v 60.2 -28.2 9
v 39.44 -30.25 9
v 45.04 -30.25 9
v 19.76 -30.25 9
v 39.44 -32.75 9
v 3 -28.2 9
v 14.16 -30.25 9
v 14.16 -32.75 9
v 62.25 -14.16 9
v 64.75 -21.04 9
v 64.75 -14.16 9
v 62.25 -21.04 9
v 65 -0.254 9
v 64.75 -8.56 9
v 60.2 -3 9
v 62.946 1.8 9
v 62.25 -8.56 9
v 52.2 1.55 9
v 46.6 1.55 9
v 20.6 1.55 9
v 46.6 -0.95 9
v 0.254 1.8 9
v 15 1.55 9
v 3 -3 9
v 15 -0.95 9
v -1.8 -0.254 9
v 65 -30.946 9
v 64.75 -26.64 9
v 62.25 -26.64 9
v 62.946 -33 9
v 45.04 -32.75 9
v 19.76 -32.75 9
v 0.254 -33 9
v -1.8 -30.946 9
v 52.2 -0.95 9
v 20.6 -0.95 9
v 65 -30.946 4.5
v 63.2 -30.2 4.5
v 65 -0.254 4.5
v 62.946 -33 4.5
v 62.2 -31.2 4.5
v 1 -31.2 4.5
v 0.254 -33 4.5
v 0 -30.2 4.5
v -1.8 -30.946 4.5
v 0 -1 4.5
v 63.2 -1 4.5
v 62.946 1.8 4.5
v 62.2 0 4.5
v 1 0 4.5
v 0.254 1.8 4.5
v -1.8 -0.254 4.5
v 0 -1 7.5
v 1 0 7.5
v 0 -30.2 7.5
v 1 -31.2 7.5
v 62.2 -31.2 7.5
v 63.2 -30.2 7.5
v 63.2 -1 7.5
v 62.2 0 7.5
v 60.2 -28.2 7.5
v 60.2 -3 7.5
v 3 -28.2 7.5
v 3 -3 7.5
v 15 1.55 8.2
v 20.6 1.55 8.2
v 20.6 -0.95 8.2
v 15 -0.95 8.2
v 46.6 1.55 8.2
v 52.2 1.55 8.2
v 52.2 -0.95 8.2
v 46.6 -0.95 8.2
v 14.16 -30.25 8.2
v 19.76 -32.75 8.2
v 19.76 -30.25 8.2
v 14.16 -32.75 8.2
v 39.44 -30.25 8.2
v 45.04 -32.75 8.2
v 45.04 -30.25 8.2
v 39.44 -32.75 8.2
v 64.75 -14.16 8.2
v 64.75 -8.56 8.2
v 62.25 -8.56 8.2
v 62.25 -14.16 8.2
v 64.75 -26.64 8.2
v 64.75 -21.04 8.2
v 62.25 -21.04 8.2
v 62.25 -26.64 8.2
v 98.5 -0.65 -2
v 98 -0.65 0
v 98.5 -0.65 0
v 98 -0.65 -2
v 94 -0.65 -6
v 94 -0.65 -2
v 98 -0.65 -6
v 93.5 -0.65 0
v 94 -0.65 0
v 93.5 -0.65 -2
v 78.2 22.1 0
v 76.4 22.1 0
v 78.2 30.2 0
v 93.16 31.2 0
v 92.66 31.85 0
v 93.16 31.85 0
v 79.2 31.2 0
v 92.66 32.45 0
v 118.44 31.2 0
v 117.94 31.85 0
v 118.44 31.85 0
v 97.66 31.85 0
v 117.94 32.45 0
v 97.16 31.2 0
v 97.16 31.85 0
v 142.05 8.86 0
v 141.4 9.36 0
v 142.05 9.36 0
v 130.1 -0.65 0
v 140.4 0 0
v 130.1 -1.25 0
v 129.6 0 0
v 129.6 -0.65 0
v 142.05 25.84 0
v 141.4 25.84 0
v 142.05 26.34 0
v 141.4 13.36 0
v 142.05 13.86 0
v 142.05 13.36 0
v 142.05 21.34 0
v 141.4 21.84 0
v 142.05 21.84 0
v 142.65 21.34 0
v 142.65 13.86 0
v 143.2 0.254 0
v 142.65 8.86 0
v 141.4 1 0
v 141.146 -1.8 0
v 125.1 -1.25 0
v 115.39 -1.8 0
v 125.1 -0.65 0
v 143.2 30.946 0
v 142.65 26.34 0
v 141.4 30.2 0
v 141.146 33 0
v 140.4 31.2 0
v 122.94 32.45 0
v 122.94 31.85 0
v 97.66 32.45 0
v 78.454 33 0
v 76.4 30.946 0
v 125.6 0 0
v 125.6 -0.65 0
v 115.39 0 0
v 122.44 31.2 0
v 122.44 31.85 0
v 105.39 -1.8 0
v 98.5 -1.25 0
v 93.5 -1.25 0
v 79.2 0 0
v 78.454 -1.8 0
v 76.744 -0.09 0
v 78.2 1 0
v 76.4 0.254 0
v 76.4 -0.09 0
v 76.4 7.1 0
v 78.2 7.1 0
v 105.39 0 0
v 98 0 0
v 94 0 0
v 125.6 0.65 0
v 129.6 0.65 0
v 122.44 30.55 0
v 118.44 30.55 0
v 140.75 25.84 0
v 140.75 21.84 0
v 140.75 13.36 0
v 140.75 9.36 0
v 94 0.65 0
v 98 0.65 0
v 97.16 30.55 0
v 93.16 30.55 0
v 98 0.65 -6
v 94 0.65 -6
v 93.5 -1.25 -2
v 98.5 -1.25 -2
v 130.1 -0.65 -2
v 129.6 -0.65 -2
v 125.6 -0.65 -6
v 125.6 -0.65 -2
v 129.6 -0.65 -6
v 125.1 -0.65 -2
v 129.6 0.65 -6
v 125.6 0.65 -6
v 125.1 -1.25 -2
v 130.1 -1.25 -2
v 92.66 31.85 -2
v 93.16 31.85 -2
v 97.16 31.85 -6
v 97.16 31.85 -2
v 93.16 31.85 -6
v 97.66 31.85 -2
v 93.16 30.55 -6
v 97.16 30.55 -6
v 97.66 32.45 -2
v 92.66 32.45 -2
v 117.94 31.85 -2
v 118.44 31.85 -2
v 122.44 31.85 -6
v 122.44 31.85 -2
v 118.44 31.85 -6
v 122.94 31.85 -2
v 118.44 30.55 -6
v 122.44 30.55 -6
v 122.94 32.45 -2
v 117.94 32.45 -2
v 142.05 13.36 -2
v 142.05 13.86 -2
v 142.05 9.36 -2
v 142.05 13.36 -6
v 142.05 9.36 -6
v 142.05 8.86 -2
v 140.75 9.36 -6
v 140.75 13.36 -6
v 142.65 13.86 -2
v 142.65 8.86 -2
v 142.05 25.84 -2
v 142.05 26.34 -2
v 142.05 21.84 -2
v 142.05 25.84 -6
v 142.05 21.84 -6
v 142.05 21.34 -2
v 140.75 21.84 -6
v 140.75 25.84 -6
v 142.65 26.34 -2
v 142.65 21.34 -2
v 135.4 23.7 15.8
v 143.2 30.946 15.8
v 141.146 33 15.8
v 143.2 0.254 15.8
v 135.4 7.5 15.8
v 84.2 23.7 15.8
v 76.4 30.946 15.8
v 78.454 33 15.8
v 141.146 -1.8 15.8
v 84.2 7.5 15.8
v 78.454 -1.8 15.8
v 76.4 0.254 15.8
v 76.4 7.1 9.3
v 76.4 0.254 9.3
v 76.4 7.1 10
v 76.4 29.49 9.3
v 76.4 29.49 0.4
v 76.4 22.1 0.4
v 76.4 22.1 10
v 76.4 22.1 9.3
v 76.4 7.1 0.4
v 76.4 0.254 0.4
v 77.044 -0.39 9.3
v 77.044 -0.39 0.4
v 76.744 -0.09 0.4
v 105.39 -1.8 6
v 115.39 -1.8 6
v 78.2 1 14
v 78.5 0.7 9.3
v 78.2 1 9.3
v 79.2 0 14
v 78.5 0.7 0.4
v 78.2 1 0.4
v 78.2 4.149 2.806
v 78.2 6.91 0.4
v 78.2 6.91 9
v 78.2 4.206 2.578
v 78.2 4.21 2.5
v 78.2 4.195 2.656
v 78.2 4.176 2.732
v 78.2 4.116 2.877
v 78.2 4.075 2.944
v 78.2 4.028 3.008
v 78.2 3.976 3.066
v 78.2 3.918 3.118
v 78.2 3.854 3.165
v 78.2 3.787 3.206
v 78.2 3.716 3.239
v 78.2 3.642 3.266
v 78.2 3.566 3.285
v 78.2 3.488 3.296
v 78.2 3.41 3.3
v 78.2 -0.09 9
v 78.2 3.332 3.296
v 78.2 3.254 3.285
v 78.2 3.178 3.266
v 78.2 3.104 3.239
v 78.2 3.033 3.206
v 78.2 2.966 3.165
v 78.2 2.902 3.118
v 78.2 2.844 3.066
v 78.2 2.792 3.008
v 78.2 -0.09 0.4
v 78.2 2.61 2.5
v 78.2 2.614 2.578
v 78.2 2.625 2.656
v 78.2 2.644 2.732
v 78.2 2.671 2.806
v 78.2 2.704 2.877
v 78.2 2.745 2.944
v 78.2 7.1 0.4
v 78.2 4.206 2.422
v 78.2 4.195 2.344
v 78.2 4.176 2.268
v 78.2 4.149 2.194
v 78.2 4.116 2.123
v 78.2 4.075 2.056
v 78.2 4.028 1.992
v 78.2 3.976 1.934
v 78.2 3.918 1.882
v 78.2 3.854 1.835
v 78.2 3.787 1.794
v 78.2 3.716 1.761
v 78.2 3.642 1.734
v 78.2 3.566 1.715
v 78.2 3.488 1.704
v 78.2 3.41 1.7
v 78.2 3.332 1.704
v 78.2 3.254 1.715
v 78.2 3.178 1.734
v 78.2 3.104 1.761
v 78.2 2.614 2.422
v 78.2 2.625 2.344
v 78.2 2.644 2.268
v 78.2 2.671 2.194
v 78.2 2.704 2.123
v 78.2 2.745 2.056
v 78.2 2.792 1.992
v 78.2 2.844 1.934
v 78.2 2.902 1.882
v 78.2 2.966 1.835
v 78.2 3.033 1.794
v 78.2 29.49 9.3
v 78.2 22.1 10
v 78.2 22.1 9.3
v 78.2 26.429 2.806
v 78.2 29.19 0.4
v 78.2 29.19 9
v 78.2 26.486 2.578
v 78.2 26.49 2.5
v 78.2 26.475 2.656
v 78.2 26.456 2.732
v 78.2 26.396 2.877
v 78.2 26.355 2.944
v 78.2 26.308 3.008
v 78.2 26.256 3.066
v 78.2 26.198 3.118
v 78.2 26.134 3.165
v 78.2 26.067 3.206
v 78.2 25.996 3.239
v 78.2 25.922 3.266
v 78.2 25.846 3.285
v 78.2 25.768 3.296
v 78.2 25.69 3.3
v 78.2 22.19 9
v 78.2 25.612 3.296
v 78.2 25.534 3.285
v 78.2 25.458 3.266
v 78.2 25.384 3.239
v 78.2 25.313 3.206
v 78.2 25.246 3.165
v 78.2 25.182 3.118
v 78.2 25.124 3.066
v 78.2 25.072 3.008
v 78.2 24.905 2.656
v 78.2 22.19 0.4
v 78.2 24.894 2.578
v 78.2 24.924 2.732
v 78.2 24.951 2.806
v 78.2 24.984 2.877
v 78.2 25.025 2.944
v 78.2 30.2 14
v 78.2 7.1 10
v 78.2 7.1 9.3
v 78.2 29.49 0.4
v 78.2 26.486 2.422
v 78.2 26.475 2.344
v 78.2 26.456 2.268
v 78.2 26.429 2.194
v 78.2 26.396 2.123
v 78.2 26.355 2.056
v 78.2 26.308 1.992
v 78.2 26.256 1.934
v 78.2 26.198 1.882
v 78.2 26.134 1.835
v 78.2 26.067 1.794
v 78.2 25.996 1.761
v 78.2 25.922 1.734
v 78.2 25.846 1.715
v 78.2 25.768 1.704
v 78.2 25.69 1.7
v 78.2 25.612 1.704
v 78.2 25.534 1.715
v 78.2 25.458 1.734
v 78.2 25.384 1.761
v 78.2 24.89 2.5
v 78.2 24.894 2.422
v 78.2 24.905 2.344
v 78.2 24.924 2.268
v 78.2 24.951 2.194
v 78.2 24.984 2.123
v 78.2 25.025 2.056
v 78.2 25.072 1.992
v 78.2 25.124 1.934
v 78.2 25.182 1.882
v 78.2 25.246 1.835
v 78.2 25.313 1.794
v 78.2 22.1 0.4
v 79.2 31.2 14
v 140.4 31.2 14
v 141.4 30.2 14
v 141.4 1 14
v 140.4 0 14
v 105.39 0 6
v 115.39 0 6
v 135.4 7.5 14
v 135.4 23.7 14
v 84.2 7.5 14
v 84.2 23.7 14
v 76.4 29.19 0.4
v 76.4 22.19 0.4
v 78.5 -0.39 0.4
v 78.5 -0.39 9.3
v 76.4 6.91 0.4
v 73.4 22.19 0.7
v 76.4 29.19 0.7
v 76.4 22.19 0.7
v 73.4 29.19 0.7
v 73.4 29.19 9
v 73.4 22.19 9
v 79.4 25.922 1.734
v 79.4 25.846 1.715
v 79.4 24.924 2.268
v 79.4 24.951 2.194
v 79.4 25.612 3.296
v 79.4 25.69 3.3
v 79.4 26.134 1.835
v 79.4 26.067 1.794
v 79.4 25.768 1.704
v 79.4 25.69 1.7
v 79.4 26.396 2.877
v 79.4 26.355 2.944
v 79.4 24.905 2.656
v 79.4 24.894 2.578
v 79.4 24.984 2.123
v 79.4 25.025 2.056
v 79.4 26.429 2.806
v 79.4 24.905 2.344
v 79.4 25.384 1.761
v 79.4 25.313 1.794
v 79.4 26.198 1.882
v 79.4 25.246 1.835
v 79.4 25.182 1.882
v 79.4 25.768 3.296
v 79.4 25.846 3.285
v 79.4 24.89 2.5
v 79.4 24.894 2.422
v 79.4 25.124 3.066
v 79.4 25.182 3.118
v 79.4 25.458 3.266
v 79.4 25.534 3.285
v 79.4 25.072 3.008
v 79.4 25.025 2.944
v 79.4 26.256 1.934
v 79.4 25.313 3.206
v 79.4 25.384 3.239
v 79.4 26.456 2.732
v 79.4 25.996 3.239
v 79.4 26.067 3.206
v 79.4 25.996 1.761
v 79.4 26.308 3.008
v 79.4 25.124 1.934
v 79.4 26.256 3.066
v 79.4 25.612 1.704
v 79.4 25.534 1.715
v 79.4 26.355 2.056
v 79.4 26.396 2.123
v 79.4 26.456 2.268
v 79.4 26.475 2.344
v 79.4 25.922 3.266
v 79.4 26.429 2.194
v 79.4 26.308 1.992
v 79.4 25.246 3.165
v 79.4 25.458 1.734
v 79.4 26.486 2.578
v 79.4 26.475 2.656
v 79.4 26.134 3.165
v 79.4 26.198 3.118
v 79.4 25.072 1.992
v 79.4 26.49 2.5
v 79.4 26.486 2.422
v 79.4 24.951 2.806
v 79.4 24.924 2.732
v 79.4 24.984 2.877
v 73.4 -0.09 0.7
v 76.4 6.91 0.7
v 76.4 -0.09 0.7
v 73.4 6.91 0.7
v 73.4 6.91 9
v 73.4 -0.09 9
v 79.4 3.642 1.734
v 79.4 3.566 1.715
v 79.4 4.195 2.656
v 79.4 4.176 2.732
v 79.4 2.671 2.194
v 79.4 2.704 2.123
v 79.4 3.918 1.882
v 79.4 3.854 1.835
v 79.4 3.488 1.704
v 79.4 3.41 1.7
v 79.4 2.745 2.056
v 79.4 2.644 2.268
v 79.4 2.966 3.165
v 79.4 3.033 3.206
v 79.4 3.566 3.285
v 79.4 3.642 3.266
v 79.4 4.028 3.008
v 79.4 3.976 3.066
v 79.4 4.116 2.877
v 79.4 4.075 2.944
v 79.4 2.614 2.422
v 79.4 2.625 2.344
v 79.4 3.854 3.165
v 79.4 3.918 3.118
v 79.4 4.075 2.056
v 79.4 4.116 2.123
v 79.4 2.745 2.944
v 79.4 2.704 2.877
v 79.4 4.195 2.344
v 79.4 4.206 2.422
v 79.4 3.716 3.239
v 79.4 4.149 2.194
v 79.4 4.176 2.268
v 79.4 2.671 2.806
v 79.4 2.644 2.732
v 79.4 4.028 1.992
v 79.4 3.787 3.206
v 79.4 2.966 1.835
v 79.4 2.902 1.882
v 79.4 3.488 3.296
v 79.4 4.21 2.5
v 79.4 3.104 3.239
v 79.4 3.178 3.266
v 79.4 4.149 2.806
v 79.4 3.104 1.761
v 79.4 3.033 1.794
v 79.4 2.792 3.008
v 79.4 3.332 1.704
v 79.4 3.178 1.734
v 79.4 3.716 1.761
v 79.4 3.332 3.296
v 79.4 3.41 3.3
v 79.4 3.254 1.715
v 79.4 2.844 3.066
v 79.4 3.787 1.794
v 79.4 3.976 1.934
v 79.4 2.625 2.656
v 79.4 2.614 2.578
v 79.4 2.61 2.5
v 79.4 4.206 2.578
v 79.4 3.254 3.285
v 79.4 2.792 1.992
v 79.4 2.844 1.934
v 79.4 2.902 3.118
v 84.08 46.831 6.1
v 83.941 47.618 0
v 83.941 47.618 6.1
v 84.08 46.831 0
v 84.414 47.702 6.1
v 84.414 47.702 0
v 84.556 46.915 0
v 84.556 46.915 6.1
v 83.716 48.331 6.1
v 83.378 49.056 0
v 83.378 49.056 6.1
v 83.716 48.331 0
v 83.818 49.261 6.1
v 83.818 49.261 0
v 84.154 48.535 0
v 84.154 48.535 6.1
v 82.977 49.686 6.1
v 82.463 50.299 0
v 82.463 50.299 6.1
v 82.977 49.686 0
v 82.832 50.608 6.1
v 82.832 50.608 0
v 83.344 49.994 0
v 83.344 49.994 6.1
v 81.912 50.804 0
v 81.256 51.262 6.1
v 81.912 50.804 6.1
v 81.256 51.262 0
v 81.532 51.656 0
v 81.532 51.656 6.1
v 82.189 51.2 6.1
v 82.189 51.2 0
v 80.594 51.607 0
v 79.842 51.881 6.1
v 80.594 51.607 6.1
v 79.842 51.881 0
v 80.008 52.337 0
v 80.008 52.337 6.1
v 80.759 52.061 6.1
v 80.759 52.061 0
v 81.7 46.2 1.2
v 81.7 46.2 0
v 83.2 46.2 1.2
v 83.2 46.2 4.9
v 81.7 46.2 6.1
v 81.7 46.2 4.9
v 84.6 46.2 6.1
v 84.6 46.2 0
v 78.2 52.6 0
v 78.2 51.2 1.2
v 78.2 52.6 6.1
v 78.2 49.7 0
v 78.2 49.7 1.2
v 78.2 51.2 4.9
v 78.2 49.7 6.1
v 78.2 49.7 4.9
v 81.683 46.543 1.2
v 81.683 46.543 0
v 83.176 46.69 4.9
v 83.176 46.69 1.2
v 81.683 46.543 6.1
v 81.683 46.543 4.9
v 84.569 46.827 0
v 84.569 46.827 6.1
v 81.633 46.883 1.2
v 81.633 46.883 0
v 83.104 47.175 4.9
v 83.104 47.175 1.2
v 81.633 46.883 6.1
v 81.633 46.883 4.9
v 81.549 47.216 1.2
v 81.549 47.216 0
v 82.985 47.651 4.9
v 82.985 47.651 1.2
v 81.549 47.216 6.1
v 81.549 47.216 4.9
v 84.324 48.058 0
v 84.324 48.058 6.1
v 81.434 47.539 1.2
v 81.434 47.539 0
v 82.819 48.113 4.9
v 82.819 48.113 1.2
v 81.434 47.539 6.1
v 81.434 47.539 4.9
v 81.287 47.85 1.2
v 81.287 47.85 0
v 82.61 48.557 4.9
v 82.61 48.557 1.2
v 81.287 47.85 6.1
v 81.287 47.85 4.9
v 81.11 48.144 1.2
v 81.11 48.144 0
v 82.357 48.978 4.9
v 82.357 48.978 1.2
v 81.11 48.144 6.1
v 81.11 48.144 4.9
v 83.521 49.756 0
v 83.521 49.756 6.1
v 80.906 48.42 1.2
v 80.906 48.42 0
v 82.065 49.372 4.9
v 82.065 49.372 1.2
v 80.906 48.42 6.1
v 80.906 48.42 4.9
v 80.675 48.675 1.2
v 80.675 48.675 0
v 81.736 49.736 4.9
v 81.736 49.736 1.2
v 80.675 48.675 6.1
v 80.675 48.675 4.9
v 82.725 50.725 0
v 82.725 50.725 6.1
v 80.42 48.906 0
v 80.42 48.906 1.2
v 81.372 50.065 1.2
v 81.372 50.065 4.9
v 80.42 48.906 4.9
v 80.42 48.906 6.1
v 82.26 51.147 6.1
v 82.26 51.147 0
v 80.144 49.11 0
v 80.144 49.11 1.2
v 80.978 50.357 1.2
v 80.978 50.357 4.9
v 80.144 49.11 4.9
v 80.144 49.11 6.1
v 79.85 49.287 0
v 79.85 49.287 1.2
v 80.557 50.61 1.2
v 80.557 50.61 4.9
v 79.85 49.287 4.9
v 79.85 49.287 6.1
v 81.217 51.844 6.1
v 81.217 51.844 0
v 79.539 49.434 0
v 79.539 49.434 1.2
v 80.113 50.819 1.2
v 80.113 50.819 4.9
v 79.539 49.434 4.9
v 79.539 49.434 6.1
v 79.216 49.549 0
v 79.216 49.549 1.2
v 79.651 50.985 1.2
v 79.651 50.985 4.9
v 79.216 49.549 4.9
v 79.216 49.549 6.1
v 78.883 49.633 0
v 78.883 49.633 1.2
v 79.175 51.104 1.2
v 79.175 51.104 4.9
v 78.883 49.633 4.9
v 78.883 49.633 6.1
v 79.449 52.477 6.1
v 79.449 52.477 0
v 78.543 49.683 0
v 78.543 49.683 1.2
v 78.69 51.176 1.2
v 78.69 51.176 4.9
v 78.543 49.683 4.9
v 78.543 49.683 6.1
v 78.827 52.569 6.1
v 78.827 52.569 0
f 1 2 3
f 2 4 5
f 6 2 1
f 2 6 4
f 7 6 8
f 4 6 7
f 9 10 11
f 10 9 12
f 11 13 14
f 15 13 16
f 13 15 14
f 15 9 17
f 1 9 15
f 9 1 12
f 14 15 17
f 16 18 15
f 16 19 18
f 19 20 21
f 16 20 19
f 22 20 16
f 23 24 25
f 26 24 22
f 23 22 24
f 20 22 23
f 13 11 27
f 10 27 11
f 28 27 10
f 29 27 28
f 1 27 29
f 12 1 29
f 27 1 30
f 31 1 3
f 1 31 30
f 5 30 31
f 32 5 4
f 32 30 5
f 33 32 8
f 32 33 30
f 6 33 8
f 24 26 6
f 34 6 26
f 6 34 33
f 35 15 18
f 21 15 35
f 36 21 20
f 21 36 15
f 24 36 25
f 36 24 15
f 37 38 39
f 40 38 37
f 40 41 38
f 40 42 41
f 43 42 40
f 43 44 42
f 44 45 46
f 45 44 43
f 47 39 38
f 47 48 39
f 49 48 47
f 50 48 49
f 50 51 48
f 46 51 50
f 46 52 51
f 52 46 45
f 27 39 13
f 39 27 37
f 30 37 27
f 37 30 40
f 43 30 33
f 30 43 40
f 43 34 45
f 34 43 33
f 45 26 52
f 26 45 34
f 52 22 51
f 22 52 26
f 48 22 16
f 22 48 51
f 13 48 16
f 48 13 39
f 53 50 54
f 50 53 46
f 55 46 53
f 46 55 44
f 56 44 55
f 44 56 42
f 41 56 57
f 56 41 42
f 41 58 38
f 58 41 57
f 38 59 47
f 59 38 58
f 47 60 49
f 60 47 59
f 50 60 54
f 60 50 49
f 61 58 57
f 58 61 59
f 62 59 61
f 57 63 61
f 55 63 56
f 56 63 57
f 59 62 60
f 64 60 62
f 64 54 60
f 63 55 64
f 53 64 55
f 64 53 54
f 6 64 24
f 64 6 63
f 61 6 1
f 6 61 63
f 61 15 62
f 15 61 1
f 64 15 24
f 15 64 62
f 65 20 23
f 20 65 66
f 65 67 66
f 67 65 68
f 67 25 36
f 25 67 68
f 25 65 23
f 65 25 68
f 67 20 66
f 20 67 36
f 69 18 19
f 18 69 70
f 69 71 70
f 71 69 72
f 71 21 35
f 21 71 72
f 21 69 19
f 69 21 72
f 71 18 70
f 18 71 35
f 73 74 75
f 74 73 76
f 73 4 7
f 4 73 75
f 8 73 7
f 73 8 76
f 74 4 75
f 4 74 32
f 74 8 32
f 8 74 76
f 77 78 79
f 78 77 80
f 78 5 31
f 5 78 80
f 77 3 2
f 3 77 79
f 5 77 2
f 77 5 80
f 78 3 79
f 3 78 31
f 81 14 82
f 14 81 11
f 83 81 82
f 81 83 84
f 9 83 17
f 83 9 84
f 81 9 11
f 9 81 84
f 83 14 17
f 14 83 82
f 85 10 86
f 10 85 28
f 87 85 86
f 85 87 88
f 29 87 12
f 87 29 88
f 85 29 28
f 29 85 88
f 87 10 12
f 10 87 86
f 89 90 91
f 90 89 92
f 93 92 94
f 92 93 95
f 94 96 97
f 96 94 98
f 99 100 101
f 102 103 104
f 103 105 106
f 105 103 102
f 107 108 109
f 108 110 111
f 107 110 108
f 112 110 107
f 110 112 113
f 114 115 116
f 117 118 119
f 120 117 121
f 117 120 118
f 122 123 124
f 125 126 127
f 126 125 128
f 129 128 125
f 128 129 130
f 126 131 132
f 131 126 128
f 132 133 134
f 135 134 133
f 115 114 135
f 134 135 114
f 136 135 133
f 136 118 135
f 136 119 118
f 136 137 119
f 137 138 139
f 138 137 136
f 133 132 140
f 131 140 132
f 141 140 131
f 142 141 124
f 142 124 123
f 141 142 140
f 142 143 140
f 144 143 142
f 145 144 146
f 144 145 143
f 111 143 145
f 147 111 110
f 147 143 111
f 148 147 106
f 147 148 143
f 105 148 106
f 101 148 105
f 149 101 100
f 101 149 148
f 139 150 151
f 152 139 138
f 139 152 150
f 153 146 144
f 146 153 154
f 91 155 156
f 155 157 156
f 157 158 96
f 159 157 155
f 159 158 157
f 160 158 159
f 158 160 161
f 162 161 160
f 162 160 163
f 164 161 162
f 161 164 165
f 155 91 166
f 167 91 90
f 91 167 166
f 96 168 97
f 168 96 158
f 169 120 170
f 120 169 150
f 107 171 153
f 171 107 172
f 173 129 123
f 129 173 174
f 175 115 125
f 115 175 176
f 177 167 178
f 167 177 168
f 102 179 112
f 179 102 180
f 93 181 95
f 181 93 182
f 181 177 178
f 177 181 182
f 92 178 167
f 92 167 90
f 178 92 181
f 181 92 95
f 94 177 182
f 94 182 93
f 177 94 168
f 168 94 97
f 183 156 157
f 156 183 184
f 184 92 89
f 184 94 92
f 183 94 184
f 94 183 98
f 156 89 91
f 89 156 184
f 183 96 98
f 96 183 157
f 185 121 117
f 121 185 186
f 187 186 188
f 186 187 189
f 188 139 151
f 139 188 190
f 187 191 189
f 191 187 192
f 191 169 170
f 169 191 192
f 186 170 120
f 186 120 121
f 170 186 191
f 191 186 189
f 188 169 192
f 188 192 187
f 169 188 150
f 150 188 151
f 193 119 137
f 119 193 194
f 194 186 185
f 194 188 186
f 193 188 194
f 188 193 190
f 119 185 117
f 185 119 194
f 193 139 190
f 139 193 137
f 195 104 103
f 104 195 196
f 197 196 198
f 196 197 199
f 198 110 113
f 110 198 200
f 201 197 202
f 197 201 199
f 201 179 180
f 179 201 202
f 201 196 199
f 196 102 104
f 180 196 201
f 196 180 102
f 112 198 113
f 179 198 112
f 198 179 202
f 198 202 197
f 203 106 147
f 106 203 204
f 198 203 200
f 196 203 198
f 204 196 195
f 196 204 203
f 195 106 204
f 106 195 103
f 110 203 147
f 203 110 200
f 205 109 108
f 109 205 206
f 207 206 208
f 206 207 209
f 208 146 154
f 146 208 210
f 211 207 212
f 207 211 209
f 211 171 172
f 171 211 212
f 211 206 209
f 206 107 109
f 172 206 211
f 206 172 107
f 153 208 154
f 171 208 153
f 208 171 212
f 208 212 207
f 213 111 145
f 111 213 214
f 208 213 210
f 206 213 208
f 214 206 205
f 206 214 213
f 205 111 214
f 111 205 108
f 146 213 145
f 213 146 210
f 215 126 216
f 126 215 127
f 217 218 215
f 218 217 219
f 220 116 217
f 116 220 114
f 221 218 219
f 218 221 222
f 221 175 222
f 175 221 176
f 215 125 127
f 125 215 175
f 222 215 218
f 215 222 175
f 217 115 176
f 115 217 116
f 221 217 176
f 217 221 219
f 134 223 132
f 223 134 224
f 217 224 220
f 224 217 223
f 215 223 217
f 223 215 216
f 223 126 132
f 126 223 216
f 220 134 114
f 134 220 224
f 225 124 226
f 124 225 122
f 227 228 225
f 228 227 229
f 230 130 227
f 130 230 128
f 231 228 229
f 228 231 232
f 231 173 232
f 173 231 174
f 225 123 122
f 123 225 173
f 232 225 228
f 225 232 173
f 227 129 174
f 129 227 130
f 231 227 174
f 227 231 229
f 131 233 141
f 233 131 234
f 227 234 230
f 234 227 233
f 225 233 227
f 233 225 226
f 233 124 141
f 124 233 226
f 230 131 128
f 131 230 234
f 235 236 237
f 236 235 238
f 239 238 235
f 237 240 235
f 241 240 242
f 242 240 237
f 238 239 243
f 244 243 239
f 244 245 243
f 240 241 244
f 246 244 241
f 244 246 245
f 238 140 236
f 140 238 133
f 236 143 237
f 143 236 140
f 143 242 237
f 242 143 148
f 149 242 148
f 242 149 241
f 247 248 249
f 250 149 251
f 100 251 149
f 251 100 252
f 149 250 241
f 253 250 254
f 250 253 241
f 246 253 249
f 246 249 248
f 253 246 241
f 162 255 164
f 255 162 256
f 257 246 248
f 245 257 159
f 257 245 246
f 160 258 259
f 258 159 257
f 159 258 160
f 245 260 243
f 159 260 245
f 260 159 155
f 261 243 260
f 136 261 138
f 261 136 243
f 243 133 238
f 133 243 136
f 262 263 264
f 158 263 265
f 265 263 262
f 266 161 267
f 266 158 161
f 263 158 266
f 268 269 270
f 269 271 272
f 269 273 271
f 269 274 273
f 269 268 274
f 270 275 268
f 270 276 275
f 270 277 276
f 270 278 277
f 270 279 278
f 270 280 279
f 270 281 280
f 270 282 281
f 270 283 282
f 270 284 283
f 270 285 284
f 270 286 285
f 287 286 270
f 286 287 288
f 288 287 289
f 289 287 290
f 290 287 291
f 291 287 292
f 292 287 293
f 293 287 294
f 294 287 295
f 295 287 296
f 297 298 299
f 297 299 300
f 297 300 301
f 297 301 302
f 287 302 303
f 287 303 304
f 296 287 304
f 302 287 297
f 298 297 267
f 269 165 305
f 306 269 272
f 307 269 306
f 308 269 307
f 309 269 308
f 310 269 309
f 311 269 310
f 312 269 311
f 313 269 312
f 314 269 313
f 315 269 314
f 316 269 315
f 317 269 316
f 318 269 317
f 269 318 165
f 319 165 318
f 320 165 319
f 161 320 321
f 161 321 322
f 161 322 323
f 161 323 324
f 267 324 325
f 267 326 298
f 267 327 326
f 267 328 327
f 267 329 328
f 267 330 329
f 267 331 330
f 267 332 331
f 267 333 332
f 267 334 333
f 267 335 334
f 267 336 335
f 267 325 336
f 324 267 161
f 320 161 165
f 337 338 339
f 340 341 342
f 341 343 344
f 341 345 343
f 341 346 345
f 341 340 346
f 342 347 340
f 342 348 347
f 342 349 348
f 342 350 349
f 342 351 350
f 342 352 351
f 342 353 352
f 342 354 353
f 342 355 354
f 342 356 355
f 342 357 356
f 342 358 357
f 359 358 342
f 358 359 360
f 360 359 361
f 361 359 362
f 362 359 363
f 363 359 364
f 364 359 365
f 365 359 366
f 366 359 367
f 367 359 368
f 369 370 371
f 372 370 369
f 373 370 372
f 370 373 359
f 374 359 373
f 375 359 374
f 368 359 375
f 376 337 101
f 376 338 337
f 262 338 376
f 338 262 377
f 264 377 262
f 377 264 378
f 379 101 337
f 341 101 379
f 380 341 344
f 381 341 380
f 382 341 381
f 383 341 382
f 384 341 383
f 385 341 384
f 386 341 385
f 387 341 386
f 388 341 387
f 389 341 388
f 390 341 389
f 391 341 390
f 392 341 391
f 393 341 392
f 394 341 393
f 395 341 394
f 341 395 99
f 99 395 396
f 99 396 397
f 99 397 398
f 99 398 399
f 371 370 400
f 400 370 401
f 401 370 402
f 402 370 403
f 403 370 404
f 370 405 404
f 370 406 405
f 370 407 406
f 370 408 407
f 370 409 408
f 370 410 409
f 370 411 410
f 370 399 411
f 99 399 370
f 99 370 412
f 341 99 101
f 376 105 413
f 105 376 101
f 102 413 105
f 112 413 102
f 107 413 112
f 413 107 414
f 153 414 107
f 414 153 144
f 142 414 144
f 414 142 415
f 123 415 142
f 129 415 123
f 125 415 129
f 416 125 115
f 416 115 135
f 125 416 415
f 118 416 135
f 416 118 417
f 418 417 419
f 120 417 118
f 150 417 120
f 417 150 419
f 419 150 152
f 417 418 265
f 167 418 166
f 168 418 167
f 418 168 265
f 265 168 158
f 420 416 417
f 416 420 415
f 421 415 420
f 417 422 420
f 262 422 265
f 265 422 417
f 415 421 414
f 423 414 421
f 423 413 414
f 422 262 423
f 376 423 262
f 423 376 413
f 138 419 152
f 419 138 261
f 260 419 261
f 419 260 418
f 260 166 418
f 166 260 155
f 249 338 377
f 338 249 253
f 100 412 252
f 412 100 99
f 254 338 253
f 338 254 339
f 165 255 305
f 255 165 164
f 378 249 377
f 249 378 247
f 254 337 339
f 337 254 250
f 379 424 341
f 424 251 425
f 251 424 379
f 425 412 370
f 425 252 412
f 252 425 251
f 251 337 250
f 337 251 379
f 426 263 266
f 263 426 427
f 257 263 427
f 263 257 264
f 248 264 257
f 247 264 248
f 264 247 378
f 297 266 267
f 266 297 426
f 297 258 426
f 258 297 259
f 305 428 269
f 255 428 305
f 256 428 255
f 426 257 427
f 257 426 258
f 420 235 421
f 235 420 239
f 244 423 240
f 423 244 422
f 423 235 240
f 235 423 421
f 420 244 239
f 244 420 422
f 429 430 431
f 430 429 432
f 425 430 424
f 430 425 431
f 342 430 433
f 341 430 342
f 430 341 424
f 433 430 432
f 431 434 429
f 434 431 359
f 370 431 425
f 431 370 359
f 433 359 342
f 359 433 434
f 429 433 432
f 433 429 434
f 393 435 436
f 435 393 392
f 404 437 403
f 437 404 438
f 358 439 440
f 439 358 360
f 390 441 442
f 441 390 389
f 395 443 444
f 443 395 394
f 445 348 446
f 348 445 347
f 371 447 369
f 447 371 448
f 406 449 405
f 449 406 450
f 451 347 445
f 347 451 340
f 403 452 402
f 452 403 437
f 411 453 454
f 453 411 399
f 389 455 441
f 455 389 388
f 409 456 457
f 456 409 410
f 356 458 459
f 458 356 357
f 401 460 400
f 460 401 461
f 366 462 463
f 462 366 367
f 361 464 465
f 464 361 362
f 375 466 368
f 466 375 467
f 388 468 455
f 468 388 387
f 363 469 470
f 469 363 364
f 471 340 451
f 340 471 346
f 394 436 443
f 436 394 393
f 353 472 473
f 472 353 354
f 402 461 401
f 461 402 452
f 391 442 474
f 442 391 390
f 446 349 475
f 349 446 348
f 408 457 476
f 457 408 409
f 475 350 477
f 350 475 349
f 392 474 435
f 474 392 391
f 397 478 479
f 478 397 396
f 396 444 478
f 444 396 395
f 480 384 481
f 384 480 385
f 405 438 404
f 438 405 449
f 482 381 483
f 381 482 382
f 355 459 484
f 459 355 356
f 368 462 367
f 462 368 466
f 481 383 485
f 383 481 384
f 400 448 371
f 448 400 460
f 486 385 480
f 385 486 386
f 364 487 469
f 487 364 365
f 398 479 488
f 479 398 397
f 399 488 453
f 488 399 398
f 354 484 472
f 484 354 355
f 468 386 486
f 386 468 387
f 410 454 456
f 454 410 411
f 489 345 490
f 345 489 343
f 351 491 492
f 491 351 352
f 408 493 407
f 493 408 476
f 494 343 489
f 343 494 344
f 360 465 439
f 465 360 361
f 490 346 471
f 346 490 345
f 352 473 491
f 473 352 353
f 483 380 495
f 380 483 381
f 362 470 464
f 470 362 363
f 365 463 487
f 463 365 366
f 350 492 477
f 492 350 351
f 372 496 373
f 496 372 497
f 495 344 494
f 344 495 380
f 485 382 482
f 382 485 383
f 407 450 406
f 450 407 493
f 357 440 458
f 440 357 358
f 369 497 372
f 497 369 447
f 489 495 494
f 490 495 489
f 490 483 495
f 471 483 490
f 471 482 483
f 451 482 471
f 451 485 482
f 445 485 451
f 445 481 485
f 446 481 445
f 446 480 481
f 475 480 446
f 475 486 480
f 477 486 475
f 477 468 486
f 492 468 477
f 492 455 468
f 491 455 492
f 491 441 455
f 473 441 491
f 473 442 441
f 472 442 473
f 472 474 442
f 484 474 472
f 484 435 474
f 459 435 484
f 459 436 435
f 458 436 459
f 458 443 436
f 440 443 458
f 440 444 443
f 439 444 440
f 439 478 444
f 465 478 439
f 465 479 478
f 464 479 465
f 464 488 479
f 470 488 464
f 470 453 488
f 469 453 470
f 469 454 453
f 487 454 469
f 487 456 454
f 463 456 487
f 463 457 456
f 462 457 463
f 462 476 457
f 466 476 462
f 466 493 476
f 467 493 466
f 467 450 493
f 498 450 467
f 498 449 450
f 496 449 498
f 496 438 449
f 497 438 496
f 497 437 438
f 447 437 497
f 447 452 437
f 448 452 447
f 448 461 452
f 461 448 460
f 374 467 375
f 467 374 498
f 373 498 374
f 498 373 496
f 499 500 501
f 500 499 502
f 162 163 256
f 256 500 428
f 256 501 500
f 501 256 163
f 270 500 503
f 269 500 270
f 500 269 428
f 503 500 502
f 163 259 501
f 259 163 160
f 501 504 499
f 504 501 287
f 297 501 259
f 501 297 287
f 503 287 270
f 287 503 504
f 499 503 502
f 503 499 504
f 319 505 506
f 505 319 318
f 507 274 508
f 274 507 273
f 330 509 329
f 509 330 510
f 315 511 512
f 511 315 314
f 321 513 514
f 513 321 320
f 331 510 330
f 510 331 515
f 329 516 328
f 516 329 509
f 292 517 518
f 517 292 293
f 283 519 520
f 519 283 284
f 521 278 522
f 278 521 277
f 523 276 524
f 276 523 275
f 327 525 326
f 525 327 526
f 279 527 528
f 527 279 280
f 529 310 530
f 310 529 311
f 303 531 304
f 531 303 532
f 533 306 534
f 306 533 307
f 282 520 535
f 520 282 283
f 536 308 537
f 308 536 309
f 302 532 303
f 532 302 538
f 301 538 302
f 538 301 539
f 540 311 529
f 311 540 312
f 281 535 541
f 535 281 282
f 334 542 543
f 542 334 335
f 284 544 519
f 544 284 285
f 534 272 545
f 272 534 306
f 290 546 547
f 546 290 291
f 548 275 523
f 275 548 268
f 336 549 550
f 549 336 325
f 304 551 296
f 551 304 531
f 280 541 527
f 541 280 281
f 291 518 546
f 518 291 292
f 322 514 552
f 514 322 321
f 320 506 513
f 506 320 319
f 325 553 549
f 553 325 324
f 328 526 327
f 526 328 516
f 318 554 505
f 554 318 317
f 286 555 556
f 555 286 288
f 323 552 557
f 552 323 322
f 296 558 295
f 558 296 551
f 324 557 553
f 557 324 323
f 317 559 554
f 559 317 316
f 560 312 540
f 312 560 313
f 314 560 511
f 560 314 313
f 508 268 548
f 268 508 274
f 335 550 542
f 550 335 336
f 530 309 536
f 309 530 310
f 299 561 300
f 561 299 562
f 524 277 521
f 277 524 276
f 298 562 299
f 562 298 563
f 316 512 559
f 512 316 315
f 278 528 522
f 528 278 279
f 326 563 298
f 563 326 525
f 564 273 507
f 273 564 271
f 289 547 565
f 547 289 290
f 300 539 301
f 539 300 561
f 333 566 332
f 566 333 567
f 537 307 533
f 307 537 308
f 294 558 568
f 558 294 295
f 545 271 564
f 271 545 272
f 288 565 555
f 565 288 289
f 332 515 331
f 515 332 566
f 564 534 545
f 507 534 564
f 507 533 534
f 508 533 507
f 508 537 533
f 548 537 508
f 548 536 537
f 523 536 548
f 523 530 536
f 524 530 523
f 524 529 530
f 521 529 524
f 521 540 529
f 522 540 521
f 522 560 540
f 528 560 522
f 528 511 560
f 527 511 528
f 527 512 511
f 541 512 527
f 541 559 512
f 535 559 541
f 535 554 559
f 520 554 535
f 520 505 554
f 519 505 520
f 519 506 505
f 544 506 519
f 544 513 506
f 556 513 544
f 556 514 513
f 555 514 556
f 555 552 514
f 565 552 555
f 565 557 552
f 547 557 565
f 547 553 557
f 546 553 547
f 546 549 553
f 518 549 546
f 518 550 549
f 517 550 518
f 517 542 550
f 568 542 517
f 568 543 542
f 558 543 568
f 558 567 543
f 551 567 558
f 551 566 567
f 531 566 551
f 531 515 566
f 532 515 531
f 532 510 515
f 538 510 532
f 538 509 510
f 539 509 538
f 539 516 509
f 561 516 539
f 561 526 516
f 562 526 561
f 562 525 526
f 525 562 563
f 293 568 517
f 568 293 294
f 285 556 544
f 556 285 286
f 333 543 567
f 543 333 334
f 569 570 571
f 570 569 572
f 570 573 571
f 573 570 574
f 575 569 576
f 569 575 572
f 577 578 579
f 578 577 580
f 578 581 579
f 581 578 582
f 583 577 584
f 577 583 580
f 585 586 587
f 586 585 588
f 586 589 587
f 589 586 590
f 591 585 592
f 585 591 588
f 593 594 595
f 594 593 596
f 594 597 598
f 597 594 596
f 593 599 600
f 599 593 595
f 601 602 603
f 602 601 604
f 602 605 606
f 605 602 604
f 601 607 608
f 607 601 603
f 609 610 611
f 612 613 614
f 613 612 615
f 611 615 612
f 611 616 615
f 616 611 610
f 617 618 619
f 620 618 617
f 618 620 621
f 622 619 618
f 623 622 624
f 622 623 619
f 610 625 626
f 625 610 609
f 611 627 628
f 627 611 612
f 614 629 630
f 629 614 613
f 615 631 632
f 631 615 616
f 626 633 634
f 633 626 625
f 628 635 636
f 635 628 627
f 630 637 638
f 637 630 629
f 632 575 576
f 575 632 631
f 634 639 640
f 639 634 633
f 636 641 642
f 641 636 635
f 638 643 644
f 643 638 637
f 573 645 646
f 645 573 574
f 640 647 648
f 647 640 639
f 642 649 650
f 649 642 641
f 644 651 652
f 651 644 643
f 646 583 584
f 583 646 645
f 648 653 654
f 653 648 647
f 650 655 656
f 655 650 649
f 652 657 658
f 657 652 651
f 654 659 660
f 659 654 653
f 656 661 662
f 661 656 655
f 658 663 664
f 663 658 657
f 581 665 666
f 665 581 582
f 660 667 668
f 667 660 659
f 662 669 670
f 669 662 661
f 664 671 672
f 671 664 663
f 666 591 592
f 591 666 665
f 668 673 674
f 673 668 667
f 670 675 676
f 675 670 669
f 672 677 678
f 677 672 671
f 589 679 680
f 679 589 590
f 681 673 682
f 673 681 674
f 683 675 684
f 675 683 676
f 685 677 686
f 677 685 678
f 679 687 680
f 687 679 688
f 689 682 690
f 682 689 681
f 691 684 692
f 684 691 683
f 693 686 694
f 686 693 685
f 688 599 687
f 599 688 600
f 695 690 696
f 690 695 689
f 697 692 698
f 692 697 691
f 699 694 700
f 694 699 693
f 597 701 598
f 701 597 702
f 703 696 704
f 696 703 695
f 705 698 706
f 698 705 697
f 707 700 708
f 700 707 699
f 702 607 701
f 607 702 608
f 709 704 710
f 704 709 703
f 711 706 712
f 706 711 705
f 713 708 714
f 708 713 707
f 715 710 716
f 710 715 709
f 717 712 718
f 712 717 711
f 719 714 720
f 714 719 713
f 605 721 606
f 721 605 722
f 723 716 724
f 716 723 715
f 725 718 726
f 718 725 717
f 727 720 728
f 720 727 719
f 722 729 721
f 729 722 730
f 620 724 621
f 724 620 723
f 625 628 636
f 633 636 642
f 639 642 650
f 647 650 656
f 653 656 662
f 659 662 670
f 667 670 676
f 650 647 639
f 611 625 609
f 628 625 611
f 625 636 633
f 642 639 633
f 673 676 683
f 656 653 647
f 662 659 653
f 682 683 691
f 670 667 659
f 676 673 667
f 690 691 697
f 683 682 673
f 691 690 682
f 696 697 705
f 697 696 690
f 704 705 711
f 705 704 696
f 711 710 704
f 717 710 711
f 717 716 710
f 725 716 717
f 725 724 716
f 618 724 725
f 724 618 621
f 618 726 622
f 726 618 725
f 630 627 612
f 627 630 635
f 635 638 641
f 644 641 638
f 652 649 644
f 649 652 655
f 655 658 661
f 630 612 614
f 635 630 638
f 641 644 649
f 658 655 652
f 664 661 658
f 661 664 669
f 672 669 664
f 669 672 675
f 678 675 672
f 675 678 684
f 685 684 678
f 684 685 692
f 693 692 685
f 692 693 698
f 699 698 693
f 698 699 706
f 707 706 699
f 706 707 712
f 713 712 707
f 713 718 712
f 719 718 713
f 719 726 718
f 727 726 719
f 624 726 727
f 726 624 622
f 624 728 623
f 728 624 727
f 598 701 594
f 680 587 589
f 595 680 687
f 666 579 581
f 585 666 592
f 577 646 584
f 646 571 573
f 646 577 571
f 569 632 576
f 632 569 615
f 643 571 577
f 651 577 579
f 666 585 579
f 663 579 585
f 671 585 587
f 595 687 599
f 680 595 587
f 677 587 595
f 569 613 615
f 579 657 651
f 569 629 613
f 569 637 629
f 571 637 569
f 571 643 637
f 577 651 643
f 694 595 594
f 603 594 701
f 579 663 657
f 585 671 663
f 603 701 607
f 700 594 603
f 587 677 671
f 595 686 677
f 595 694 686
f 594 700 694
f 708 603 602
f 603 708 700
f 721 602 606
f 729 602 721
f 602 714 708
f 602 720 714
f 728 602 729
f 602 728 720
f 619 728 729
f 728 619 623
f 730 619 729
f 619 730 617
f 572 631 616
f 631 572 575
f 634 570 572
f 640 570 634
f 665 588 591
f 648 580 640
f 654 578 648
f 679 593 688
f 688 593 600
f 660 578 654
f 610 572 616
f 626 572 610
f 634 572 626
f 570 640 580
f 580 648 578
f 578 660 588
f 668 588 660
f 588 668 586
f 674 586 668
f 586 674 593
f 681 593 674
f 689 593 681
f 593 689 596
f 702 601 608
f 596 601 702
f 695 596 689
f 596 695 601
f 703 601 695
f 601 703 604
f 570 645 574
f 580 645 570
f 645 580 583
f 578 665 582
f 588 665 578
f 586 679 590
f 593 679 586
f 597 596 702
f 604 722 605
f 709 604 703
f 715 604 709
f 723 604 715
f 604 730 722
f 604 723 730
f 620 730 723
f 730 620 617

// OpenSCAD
// ============================================================================
// TinyEReader (CrowPanel ESP32 E-Paper HMI 2.13") battery case
// ============================================================================
//
// Two-piece clamshell, no fasteners: a front frame (holds the board+panel
// from the front, open at the back) and a back cover (battery bay + button
// levers) that press-fits onto it with 6 printed cantilever snap clips.
// A third, optional small part -- a grip clip for the K5 rotary wheel --
// is not part of the clamshell at all; see "Dial grip cap" below.
//
// COORDINATE CONVENTION: X/Y are board-local (origin at the PCB's
// bottom-left corner, same as Elecrow's own Eagle file). Z=0 is the PCB
// plane (the seam where the two halves meet) for BOTH pieces -- the front
// frame occupies Z<0 (toward the display), the back cover occupies Z>0
// (toward the battery). Every feature below is placed with an absolute Z
// in that shared frame, not offsets relative to some other feature, so
// it's harder for a translate() to silently double up.
//
// WHAT'S REAL vs ESTIMATED
// -------------------------
// Board outline and every connector/button XY position below came from
// Elecrow's own Eagle PCB file (CrowPanel ESP32 Display-2.13(E) Inch(1).brd,
// github.com/Elecrow-RD/CrowPanel-ESP32-2.13-E-paper-HMI-Display-with-122-250),
// cross-checked against their "hardware overview" product photo. Those
// numbers are trustworthy.
//
// Z-heights (component clearance, standoff height, tact-switch actuation
// point) are NOT from a verified source -- Eagle board files are 2D, and
// Elecrow doesn't publish a mechanical/Z drawing. Every such value is
// called out in the "VERIFY WITH CALIPERS" block below with what it means
// and a reasonable starting guess. Print a single test wall with one snap
// clip and one button lever before committing to a full print -- much
// cheaper than finding out the fit is off after a multi-hour print.
//
// !!! BATTERY CONNECTOR MISMATCH -- READ THIS FIRST !!!
// The board's BAT input is a JST SH 1.0mm-pitch 2-pin socket (confirmed
// from Elecrow's own schematic silkscreen, labeled "BAT-1.0MM-W", and
// their wiki page). The EasyLander battery linked uses a JST PH 2.0mm-pitch
// connector. These do not mate -- different pitch, physically won't plug
// in. You'll need one of:
//   - the same cell with an SH1.0 connector instead (common on other
//     listings for the same physical battery size)
//   - a JST-PH-to-JST-SH adapter/pigtail
//   - re-terminate the wire yourself (cut the PH connector off, crimp or
//     solder on an SH1.0 one, or solder straight to the board's BAT pads)
// This doesn't affect the case dimensions below -- the cell itself
// (50x15x10mm) is unaffected either way -- just the wiring.
//
// Print: PLA, 2+ perimeters, 15%+ infill. Both clamshell halves print
// face-down (flat on the bed, as laid out in the render section) -- no
// supports needed for either. The dial grip cap (3rd part) also prints
// with no supports, arc-side down.

/* [Board geometry -- REAL, from Elecrow's Eagle file] */
board_w = 63.20;          // PCB outline X extent
board_h = 31.20;          // PCB outline Y extent
corner_chamfer = 1.0;     // 45-degree corner cut, all 4 corners (matches the real outline)

// All positions below are board-local XY (origin = bottom-left of the PCB
// bounding box). This is the BACK of the board (the populated/component
// face with the buttons -- what Elecrow's "hardware overview" photo shows,
// and what this case's back cover faces).
usb_c_x   = 32.19;   // USB-C, centered on the Y=0 (bottom) edge -- the only
                      // opening besides the display and the left-edge
                      // buttons/dial. BOOT, RESET, GPIO_D, and UART0 are all
                      // sealed under solid wall -- not needed day to day,
                      // and BOOT/RESET are hardwired (bootloader/reset only,
                      // not reconfigurable), so there's nothing lost by
                      // covering them.

menu_y = 25.69;   // K3 MENU -- side-actuated tact switch, on the X=0 (left) edge
exit_y = 3.41;    // K4 EXIT -- side-actuated tact switch, on the X=0 (left) edge
dial_y = 14.60;   // K5 rotary wheel (Eagle package TM_2024A, real element center
                  // at x=7.04,y=14.60 -- the Y here is exact, from the same
                  // Eagle file as everything else). It's a round knurled wheel
                  // mounted flush near the left edge, spinning in the plane of
                  // the board (per Elecrow's product photo) -- you roll it with
                  // a fingertip through a window in the left wall, same idea as
                  // MENU/EXIT's edge access. The window alone is real geometry;
                  // the separate grip cap in the "Dial grip cap" section below
                  // is not -- see that section for what's guessed there.

/* [Battery -- from the AliExpress listing] */
bat_l = 50; bat_w = 15; bat_h_cell = 10;
bat_slack = 0.6;   // extra room per side so it slides in without forcing

/* [VERIFY WITH CALIPERS on your actual board before printing the full case] */
pcb_thickness   = 1.6;  // standard for a board this size, but confirm
front_clearance = 4.5;  // depth from the front bezel lip to the PCB plane: the
                         // panel itself, its foam/adhesive standoff, and the
                         // folded FPC ribbon on the left edge all live here.
                         // Guess based on typical thin e-paper module stacks --
                         // measure your actual assembled unit's front-to-PCB depth.
back_clearance  = 4.0;  // tallest thing on the populated face: the ESP32-S3
                         // module, tact switch bodies, USB-C connector height.
                         // Guess from typical QFN module + connector heights --
                         // measure the tallest component on your board.
switch_nub_z    = 1.8;  // height above the PCB plane where a side-tact
                         // switch's actuation nub sits (K3/K4) -- a guess for
                         // a KEY_3x6x3.5-style switch; verify against the
                         // actual part if you can read its markings

wall = 1.8;                  // case wall thickness
board_fit_clearance = 0.3;   // slack per side in the board-retention slot

/* [Snap-fit clips -- conservative proportions for PLA, not aggressive] */
clip_w      = 4;     // width along the wall
clip_len    = 6;      // how far it reaches from the seam into the other half
clip_t      = 1.3;    // arm thickness
clip_catch  = 0.6;    // how far the catch tooth sticks out sideways

$fn = 64;

// ---------------------------------------------------------------------------
// Derived
// ---------------------------------------------------------------------------
back_total_depth = back_clearance + bat_h_cell + wall;
bezel_inset = 3.0;    // how far the front opening is inset from the board edge, hiding it
shelf_depth = 1.5;    // thickness of the shelf the board rests on, measured from the front

// 2D outline of the PCB (and by extension the case, offset from this) --
// the real chamfered-rectangle shape from the Eagle "Dimension" layer. The
// board also has a small notch cut into the right edge (a manufacturing/
// routing detail, not load-bearing) that's left out here for simplicity --
// harmless to omit, it just means the case is a hair more material there
// than the real PCB silhouette.
module board_outline_2d() {
  polygon(points = [
    [0, corner_chamfer],
    [corner_chamfer, 0],
    [board_w - corner_chamfer, 0],
    [board_w, corner_chamfer],
    [board_w, board_h - corner_chamfer],
    [board_w - corner_chamfer, board_h],
    [corner_chamfer, board_h],
    [0, board_h - corner_chamfer],
  ]);
}

module wall_ring_2d() {
  difference() {
    offset(delta = wall) board_outline_2d();
    board_outline_2d();
  }
}

// ---------------------------------------------------------------------------
// Front frame: Z from -front_clearance (bezel face) to 0 (seam). A bezel
// lip at the very front hides the board edge and holds the panel from
// pushing forward; a shelf partway back is what the board actually rests
// its face against; side walls run the rest of the way back to the seam.
// ---------------------------------------------------------------------------
module front_frame() {
  difference() {
    union() {
      // Side walls, bezel face back to the seam
      translate([0, 0, -front_clearance])
        linear_extrude(front_clearance)
          wall_ring_2d();
      // Bezel lip (closes the front partway, leaving the display opening)
      translate([0, 0, -front_clearance])
        linear_extrude(shelf_depth)
          difference() {
            offset(delta = wall) board_outline_2d();
            offset(delta = -bezel_inset) board_outline_2d();
          }
    }
    // Snap-clip catch pockets, cut into the inside face of the wall right
    // at the seam -- the back cover's clip_arm() tips land here.
    for (p = clip_specs()) clip_socket(p);
  }
}

// ---------------------------------------------------------------------------
// Back cover: Z from 0 (seam) to back_total_depth (rear face). Everything
// on the populated face lives here -- the USB-C cutout, MENU/EXIT levers,
// the dial window, and the battery bay. BOOT, RESET, GPIO_D, and UART0 are
// deliberately left sealed under solid wall (see usb_c_x comment above).
// ---------------------------------------------------------------------------
module back_cover() {
  union() {
    // Everything solid, WITH the lever pockets, USB-C slot, dial window, and
    // battery bay cut out of it. The lever paddles are deliberately NOT part
    // of this union -- if they were unioned in before the lever_pocket() cut
    // (as they used to be), the pocket (sized larger than the paddle so it
    // can flex) would subtract the paddle right along with the material
    // around it, leaving nothing there. They're added back below, after the
    // cut, so they survive as real material connected only through the
    // hinge.
    difference() {
      union() {
        // Side walls, seam back through the battery bay
        linear_extrude(back_total_depth) wall_ring_2d();
        // Rear face (closes the battery bay)
        translate([0, 0, back_total_depth - wall])
          linear_extrude(wall) offset(delta = wall) board_outline_2d();
        // Snap clip arms
        for (p = clip_specs()) clip_arm(p);
      }

      // --- edge cutouts (board-local XY, absolute Z) ---
      // USB-C, bottom edge -- the only cutout besides the display opening and
      // the left-edge dial/lever pockets. BOOT, RESET, GPIO_D, and UART0 are
      // all left under solid wall on purpose (see usb_c_x comment above).
      translate([usb_c_x - 5, -wall - 1, back_clearance - 4])
        cube([10, wall + 2, 6]);
      // Dial window, left edge -- generously sized, no lever, direct access
      translate([-wall - 1, dial_y - 7.5, back_clearance - 6])
        cube([wall + 2, 15, 12]);
      // MENU / EXIT lever pockets: free the paddle on 3 sides, matching
      // menu_exit_lever()'s own geometry (hinge stays uncut, at the top)
      lever_pocket(menu_y);
      lever_pocket(exit_y);
      // Battery bay
      battery_bay_cut();
    }

    // MENU / EXIT cantilever paddles (see menu_exit_lever()) -- added after
    // the cut above, so the pocket that frees them doesn't also delete them.
    menu_exit_lever(menu_y);
    menu_exit_lever(exit_y);
  }
}

// Cantilever paddle for a side-actuated switch (K3 MENU / K4 EXIT), which
// sit right at the board's X=0 edge with their actuation nub facing +X
// (into the board). The paddle needs to be reachable from OUTSIDE the
// case, i.e. at X < -wall, and pivot so pressing it in the -X->+X
// direction (a normal "push this edge button" motion) drives a nub on its
// inner end into the switch just past X=0.
//
// It's built as an L-shape in the XZ plane: a hinge strip flush with the
// wall's own thickness (X from -wall to 0) at the BOTTOM of its Z-span,
// and a paddle body above that, spanning from outside the wall's outer
// face (X = -wall-paddle_out) in to the wall's inner face (X=0). Pressing
// the paddle's outer face flexes the hinge and swings the whole body
// slightly in +X, and the nub at its inner-top corner pokes past X=0 to
// reach the switch.
paddle_w = 7;         // along the wall (Y span)
paddle_span_z = 9;    // how tall the moving part is (Z span)
paddle_out = 3;       // how far the paddle sticks out past the wall's outer face
hinge_t = 0.7;         // flexure thickness

module menu_exit_lever(y_center) {
  z0 = 0;  // bottom of the pocket/paddle -- pinned to the seam (Z=0) so the
           // whole mechanism stays in the back cover's own Z>=0 territory
           // and can't overlap the front frame's solid wall on the other
           // side of the seam
  // hinge: thin strip across the wall's own thickness, at the bottom of the span
  translate([-wall, y_center - paddle_w / 2, z0])
    cube([wall, paddle_w, hinge_t]);
  // paddle body: outside the wall's outer face, up to its inner face, above the hinge
  translate([-wall - paddle_out, y_center - paddle_w / 2, z0 + hinge_t])
    cube([wall + paddle_out, paddle_w, paddle_span_z - hinge_t]);
  // press nub: pokes just past the wall's inner face (X=0) at the switch's
  // estimated actuation height, so deflecting the paddle presses it
  translate([-0.3, y_center, z0 + hinge_t + switch_nub_z])
    rotate([0, 90, 0]) cylinder(h = 1.5, d = 1.6);
}

// Frees the paddle body (not the hinge) on all sides so it can flex --
// same span as menu_exit_lever()'s paddle body, oversized slightly for
// print clearance.
module lever_pocket(y_center) {
  z0 = 0;  // must match menu_exit_lever()'s z0
  translate([-wall - paddle_out - 0.3, y_center - paddle_w / 2 - 0.3, z0 + hinge_t - 0.3])
    cube([wall + paddle_out + 0.6, paddle_w + 0.6, paddle_span_z - hinge_t + 0.6]);
}

// ---------------------------------------------------------------------------
// Snap-fit clips: 6 cantilever arms on the back cover (growing from Z=0
// into the front frame's Z<0 territory), catching into pockets cut in the
// front frame's wall. Each entry is [x, y, dir] where dir is a unit 2D
// vector pointing OUT of the case at that point (the direction the catch
// tooth juts toward).
//
// The left edge (X=0) gets none: the dial window and MENU/EXIT lever
// pockets already consume Y~=0 to Y~=29.2 of the board's 31.2mm height,
// leaving no clear run of wall long enough for a 4mm-wide clip -- an
// earlier version put one at Y=board_h*0.5 anyway, which landed inside the
// dial window and got carved away by that cutout, silently leaving that
// side unclipped. The right edge (X=board_w), directly opposite the
// buttons, is completely clear and previously had no clips at all, which
// is what let that side sit open -- it gets 2 here to make up for the side
// that can't have any.
// ---------------------------------------------------------------------------
function clip_specs() = [
  [board_w * 0.25, 0, [0, -1]],
  [board_w * 0.75, 0, [0, -1]],
  [board_w * 0.3, board_h, [0, 1]],
  [board_w * 0.7, board_h, [0, 1]],
  [board_w, board_h * 0.3, [1, 0]],
  [board_w, board_h * 0.7, [1, 0]],
];

module clip_arm(spec) {
  x = spec[0]; y = spec[1]; dir = spec[2];
  // local frame: origin at the wall's outer face at (x,y), z=0 = seam,
  // arm reaches toward -z (into the front frame), tooth points along `dir`
  translate([x, y, 0])
    rotate([0, 0, atan2(dir[1], dir[0])])
      translate([-clip_t / 2, 0, -clip_len])
        union() {
          cube([clip_t, clip_w, clip_len]);
          translate([clip_t, -0.5, clip_len - 2]) cube([clip_catch, clip_w + 1, 2]);
        }
}

module clip_socket(spec) {
  x = spec[0]; y = spec[1]; dir = spec[2];
  translate([x, y, 0])
    rotate([0, 0, atan2(dir[1], dir[0])])
      translate([-clip_t / 2 - 0.3, -0.8, -clip_len - 0.3])
        cube([clip_t + clip_catch + 0.6, clip_w + 1.6, 2.6]);
}

// ---------------------------------------------------------------------------
// Battery bay: pocket in the back cover, sized for the cell plus slack,
// positioned in the open middle band of the board -- clear of GPIO_D (top
// edge) and UART0/USB-C (bottom edge), which is what "between GPIO_D and
// UART0" comes out to once you plot their real Y positions.
// ---------------------------------------------------------------------------
module battery_bay_cut() {
  bay_w = bat_l + 2 * bat_slack;
  bay_h = bat_w + 2 * bat_slack;
  bay_x = (board_w - bay_w) / 2;
  bay_y = (board_h - bay_h) / 2;  // centered vertically -- clears both headers with room either side
  translate([bay_x, bay_y, back_clearance])
    cube([bay_w, bay_h, bat_h_cell + bat_slack + wall]);
}

// ---------------------------------------------------------------------------
// Dial grip cap -- OPTIONAL 3rd part, NOT fused to the clamshell, NOT
// snap-fit to anything printed. It's a small open C-channel that slides
// radially onto the exposed arc of the K5 wheel (the part already sticking
// past the board edge / visible through the dial window above) and grips
// it by friction between two thin lips, one over the wheel's front face
// and one over its back -- like a snap-on shoe. No glue, nothing touches a
// solder joint, fully reversible.
//
// UNLIKE THE REST OF THIS FILE, THE WHEEL'S OWN DIMENSIONS HERE ARE A
// GUESS. Eagle's package TM_2024A only has 2D pad/courtyard data -- there's
// no mechanical drawing for the wheel's actual molded shape, and no
// datasheet on hand for it. dial_wheel_dia/thick below are read off the
// courtyard size and the product photo, not measured. Print this part
// ALONE first (it's small and fast) and test-fit it gently on the real
// wheel before trusting it:
//   - too tight: it just won't push on -- doesn't stress the switch unless
//     you force it. Bump dial_wheel_dia/thick up 0.2-0.3mm and reprint.
//   - too loose: it'll spin free without gripping. Reduce the same amounts.
// If it never wants to grip well, going back to bare/rawdog access (which
// the plain window already gives you, cap or no cap) is a completely fine
// outcome -- this piece is a nice-to-have, not load-bearing for the case.
/* [Dial grip cap -- GUESSED, verify on the real part before trusting] */
dial_wheel_dia   = 10;    // guessed wheel OD
dial_wheel_thick = 4;     // guessed wheel thickness (its Z extent)
dial_lip_reach   = 1.5;   // how far the top/bottom lips overhang onto the wheel's faces
dial_cap_wall    = 1.4;   // radial bridge thickness -- the part you press/roll
dial_cap_arc     = 90;    // degrees of the wheel's circumference this clip covers

module dial_grip_cap() {
  r_in  = dial_wheel_dia / 2 - dial_lip_reach;
  r_out = dial_wheel_dia / 2 + dial_cap_wall;
  lip_t = 1.2;
  gap   = dial_wheel_thick - 0.3;   // slightly undersized -- friction fit
  total_h = 2 * lip_t + gap;

  difference() {
    rotate_extrude(angle = dial_cap_arc)
      translate([r_in, 0])
        difference() {
          square([r_out - r_in, total_h]);
          translate([0, lip_t]) square([r_out - r_in - dial_cap_wall, gap]);
        }
    // shallow grip grooves across the outer (pressing) face
    for (a = [10 : 15 : dial_cap_arc - 10])
      rotate([0, 0, a])
        translate([r_out - 0.5, -0.4, -1])
          cube([1, 0.8, total_h + 2]);
  }
}

// ---------------------------------------------------------------------------
// Render -- both clamshell pieces oriented print-side-down (flat on the
// bed, as OpenSCAD/a slicer would want them), laid out side by side for
// viewing, plus the dial grip cap off to the side (its case-relative X/Y
// placement here is just for looking at it together with the rest -- it
// doesn't mount to the case, it mounts to the wheel directly).
// ---------------------------------------------------------------------------
translate([0, 0, front_clearance]) rotate([180, 0, 0]) front_frame();

translate([board_w + 15, 0, 0]) back_cover();

translate([board_w + 15, board_h + 15, 0]) dial_grip_cap();
